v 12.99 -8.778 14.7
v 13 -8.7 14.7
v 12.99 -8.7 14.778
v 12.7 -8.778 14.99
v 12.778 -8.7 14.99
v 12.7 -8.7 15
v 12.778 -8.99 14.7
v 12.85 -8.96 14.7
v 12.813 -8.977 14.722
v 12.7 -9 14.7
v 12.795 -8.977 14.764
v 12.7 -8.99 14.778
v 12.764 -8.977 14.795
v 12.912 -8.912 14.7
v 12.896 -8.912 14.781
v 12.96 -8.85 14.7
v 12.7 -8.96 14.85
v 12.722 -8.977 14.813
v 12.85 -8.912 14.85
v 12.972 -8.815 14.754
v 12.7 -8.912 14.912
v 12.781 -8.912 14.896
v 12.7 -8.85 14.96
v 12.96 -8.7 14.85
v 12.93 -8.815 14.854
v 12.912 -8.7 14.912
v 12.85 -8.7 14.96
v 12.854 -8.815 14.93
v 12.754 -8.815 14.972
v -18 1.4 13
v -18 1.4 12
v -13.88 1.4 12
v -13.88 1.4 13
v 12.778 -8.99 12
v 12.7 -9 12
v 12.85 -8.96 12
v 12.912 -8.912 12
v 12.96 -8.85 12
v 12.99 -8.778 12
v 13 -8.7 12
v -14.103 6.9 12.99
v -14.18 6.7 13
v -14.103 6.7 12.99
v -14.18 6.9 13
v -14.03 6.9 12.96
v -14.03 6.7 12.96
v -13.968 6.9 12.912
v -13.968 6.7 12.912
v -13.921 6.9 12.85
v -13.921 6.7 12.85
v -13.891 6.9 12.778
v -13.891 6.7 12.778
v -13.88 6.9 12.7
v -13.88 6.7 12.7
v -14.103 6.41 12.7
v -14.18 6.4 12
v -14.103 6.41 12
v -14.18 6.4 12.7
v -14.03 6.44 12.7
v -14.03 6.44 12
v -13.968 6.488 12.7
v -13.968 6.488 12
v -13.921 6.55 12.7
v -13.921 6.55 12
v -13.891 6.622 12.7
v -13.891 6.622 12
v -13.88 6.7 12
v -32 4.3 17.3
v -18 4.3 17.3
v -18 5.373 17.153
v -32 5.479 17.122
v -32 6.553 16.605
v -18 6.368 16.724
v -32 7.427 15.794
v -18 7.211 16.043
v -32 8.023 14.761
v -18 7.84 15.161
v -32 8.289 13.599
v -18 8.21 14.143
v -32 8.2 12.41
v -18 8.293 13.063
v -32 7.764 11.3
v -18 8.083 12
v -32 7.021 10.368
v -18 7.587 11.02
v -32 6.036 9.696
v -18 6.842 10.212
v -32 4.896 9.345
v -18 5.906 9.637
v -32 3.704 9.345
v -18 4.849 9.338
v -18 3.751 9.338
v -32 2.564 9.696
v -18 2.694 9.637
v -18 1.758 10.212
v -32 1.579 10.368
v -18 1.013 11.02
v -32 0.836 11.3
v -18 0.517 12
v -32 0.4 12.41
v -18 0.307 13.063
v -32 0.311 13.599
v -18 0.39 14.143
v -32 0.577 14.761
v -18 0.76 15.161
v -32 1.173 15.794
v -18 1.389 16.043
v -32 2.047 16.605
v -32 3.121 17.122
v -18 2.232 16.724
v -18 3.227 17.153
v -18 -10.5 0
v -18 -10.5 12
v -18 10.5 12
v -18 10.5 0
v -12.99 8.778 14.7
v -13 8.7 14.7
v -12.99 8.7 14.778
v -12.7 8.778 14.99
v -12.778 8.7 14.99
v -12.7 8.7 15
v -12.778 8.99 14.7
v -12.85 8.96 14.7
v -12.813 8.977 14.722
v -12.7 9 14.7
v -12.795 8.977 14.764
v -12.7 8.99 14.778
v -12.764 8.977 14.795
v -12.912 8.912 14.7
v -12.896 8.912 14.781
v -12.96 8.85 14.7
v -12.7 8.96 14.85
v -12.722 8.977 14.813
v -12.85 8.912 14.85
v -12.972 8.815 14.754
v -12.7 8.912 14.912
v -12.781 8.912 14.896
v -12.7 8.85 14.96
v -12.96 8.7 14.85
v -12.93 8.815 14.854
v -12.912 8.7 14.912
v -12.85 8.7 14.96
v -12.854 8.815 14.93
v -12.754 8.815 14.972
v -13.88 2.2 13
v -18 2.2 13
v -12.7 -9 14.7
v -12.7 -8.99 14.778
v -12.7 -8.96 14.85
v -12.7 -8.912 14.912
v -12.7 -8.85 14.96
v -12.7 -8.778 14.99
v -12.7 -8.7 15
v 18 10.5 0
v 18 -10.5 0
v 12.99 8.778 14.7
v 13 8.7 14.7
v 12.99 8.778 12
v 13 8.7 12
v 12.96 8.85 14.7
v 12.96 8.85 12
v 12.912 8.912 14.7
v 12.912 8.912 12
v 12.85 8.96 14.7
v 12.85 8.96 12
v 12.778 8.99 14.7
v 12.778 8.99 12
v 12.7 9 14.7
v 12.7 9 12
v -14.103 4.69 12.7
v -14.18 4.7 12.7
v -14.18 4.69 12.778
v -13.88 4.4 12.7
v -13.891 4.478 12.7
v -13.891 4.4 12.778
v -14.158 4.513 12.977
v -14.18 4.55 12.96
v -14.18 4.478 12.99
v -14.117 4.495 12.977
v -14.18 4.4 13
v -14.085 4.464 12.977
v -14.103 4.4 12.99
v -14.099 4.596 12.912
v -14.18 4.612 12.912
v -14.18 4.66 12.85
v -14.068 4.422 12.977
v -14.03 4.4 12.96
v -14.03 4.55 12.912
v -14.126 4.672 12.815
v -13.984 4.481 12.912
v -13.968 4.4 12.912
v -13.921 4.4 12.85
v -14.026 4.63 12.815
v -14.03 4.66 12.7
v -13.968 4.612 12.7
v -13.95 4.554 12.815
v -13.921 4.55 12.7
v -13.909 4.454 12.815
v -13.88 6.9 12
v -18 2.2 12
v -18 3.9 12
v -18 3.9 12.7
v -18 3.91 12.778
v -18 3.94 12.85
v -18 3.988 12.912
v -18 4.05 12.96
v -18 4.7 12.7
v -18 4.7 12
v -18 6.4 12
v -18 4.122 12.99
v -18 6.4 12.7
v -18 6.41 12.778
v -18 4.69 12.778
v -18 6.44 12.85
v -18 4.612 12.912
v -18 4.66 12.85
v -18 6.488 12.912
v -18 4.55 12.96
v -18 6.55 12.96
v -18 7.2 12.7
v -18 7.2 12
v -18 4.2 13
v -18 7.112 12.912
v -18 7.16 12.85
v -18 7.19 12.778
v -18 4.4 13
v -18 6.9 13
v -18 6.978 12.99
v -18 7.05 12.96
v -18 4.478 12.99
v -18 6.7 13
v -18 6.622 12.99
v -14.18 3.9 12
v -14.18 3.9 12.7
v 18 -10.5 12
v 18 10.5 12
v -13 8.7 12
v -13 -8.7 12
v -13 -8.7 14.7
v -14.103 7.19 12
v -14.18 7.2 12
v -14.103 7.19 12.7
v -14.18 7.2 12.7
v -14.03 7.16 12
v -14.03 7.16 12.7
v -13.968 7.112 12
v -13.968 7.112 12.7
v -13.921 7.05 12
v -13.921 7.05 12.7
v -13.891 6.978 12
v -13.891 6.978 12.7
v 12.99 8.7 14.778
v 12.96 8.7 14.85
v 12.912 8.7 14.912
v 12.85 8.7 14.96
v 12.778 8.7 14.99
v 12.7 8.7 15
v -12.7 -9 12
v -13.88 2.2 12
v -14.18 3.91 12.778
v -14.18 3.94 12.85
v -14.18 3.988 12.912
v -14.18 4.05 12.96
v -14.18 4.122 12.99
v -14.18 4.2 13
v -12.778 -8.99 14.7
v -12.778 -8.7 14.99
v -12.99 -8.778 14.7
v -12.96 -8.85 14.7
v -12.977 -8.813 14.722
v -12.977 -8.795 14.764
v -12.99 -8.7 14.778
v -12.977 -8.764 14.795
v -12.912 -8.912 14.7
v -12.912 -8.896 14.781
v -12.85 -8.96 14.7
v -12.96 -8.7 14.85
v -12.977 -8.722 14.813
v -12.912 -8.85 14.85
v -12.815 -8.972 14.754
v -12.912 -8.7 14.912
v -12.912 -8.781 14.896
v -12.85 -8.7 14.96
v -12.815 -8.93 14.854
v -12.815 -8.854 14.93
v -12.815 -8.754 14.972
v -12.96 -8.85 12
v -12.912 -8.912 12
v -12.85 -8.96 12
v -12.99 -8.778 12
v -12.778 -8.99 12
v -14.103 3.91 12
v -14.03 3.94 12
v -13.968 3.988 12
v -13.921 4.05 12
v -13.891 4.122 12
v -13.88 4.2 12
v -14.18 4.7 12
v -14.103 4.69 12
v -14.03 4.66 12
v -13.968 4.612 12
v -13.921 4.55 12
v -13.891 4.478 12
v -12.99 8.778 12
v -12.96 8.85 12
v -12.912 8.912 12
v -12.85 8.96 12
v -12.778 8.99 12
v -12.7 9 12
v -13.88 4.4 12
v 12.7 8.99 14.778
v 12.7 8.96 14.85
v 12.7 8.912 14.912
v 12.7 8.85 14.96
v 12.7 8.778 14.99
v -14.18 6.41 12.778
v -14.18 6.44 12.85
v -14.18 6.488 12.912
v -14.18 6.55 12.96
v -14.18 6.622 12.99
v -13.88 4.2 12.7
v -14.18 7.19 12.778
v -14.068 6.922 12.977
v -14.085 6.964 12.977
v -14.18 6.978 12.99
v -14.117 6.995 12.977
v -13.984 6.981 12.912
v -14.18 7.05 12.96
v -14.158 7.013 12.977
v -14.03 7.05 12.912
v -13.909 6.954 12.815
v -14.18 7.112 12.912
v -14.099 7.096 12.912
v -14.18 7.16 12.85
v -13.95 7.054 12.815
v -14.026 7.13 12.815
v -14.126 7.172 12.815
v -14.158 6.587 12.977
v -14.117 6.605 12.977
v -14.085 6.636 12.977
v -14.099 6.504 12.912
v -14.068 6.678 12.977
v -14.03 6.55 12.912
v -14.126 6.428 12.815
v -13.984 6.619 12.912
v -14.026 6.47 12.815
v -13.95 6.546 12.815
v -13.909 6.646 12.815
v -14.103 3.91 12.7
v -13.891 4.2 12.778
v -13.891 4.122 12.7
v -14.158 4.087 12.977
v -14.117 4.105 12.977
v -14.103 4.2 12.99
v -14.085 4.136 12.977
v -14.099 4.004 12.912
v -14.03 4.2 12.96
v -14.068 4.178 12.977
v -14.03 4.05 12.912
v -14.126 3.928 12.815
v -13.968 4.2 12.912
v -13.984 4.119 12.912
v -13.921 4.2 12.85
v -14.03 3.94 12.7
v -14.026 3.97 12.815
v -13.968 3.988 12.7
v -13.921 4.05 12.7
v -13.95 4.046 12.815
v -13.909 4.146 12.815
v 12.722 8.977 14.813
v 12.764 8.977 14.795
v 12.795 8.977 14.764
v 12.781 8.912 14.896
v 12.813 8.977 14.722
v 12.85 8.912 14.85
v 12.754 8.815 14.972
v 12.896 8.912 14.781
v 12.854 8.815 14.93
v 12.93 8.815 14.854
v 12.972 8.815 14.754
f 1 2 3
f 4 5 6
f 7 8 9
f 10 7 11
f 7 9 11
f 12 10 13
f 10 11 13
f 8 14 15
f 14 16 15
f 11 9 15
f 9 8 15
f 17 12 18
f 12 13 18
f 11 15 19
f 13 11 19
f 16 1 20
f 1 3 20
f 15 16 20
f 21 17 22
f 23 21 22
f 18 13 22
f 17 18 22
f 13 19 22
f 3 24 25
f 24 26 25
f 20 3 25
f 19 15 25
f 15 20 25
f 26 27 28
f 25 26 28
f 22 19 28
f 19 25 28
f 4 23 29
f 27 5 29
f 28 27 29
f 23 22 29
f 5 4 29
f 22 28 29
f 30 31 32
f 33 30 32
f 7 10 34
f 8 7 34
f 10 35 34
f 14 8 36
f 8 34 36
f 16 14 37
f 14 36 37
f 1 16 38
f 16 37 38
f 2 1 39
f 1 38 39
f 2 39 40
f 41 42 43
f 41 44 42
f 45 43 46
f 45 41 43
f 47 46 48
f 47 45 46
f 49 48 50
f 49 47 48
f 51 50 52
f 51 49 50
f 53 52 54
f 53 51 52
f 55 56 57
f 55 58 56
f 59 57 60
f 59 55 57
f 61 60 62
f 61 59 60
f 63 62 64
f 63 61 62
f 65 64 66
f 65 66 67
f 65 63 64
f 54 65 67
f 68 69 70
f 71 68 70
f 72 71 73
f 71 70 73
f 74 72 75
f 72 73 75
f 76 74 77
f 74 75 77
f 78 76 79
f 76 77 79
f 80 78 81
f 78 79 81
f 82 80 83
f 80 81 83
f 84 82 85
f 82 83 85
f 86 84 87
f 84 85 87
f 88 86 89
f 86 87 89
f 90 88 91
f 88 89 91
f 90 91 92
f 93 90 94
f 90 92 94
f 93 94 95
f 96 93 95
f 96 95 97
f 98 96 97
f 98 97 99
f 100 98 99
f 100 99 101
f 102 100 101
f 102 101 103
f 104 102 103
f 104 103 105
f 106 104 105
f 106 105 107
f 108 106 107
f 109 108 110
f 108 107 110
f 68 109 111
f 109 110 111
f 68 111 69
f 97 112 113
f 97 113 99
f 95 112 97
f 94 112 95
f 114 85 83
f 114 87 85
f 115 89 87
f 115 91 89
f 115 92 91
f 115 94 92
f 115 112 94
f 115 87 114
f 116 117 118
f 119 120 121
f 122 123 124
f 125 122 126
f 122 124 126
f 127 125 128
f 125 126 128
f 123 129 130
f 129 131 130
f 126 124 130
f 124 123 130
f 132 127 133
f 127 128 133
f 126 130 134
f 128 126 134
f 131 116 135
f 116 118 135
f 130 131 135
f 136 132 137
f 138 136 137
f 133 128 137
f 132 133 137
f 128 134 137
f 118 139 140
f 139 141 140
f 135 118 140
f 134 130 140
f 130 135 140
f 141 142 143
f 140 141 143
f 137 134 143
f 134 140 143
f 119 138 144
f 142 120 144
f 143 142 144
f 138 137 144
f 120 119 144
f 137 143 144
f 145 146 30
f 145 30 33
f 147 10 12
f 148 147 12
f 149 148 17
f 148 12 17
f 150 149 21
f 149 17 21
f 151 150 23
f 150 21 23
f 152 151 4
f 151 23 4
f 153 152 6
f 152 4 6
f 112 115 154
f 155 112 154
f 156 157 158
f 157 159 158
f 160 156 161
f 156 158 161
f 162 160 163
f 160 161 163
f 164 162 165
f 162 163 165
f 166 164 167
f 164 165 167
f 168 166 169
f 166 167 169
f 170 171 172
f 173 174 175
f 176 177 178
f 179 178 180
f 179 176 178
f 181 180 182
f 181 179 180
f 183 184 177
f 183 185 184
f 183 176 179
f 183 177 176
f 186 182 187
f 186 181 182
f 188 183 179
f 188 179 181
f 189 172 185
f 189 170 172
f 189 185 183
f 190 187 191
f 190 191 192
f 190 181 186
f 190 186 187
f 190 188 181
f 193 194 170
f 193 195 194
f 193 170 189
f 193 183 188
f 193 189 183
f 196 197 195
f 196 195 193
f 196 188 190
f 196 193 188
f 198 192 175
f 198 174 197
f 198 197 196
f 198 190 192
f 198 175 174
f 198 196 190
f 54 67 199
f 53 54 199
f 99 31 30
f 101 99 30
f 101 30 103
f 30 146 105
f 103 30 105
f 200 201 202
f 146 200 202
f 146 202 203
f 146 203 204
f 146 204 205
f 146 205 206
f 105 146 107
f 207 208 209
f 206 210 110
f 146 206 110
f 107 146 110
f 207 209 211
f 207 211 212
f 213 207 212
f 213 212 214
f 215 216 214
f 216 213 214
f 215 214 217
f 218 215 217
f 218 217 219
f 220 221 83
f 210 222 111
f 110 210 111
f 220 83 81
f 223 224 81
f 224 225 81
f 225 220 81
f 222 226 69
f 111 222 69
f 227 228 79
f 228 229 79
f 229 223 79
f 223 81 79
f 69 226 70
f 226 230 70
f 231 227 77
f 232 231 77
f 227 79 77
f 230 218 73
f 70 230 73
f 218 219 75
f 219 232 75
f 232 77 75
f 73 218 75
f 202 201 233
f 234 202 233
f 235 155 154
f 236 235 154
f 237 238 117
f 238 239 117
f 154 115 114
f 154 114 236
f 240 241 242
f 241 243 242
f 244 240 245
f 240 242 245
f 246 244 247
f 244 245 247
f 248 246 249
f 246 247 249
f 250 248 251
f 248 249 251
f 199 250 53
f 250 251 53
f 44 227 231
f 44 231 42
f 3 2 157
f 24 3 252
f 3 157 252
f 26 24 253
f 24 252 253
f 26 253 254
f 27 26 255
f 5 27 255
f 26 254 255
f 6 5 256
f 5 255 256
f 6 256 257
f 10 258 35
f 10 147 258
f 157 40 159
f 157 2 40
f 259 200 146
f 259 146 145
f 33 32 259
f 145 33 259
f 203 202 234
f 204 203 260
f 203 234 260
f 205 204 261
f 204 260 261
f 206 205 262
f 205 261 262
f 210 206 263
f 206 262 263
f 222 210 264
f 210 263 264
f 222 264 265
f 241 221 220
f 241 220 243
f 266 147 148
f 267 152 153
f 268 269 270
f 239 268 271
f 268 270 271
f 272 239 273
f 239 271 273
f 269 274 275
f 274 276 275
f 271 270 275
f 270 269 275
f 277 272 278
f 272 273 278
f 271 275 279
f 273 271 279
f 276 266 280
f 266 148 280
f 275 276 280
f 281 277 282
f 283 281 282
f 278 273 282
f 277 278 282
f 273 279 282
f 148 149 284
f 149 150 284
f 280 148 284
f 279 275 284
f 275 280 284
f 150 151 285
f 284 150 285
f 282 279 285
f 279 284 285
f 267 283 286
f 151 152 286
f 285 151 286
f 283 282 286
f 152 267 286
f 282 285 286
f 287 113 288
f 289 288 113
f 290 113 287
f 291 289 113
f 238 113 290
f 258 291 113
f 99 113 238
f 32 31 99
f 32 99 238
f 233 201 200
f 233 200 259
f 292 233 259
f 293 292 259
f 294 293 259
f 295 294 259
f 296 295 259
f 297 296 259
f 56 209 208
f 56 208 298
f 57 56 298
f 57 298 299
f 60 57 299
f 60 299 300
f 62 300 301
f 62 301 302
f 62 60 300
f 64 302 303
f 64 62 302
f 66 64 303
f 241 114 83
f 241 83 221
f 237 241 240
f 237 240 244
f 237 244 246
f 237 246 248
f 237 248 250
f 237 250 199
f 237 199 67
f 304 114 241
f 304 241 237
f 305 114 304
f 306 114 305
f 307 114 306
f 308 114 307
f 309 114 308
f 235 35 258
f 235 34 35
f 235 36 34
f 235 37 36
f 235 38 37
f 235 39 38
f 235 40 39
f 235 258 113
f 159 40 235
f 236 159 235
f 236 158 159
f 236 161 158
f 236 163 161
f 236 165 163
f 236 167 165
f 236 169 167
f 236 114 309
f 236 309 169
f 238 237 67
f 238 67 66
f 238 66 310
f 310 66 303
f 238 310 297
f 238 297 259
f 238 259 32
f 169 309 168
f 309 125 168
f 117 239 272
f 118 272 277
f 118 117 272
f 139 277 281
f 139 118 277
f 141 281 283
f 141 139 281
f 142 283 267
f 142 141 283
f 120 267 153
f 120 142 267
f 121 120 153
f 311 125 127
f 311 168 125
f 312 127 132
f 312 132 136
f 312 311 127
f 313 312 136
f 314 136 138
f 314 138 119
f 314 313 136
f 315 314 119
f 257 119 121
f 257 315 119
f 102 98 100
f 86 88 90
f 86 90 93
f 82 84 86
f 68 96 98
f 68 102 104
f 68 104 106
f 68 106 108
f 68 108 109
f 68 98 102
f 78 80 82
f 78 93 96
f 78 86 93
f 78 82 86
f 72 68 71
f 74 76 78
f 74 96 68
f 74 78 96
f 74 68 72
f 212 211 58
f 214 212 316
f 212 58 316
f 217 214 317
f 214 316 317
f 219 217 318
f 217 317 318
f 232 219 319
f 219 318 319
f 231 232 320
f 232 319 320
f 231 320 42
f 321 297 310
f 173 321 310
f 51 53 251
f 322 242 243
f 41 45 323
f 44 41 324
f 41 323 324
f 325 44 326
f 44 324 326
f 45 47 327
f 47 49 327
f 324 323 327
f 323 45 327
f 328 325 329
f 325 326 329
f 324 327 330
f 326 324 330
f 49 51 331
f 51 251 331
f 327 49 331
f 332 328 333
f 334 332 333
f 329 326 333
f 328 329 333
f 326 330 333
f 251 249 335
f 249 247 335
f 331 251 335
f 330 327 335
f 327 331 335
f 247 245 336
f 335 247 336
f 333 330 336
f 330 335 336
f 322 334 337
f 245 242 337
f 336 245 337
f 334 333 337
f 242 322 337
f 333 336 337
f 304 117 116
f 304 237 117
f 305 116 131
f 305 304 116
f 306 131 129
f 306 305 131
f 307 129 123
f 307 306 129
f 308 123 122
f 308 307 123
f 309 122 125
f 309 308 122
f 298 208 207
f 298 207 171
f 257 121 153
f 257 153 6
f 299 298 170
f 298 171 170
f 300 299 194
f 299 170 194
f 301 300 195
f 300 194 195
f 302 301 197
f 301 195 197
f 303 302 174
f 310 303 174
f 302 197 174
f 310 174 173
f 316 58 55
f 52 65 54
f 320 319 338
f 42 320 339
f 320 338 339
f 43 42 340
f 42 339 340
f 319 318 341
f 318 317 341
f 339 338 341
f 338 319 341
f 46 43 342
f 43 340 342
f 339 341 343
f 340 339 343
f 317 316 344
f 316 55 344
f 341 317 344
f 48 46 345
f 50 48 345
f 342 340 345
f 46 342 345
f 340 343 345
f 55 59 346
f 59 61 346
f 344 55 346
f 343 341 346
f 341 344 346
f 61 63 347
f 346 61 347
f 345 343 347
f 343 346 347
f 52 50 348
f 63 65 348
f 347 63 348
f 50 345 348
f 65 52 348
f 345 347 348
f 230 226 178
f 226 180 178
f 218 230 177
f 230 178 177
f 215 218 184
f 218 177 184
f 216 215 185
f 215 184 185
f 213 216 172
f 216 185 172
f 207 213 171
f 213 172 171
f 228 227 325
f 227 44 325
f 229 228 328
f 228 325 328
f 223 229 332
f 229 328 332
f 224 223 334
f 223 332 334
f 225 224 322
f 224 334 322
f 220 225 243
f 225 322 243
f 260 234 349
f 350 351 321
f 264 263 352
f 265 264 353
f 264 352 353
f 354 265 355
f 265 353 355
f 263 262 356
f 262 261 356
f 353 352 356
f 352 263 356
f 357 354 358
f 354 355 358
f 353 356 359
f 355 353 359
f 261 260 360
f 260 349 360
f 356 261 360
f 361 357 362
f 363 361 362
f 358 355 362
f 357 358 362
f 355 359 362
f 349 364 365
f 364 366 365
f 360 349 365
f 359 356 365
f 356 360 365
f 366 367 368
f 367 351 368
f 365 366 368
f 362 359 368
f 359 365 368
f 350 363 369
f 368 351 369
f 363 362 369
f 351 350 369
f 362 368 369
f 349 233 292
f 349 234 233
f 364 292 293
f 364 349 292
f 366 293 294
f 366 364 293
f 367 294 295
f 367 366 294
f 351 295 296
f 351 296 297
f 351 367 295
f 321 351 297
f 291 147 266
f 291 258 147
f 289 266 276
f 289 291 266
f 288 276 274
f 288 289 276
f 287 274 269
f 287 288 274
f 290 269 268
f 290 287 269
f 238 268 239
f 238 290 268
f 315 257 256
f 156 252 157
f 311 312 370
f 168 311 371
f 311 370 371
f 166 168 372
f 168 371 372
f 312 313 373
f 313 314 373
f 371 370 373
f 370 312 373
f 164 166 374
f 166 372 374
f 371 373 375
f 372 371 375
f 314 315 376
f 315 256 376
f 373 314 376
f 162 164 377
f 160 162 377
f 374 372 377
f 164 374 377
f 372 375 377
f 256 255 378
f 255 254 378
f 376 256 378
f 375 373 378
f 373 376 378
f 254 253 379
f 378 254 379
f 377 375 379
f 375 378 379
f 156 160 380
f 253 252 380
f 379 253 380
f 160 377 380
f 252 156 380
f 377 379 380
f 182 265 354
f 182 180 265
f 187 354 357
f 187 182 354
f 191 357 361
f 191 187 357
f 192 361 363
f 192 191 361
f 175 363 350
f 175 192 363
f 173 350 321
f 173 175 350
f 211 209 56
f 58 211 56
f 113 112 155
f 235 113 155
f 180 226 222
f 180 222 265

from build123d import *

# Parameters (mm, degrees)
SKICA1_W                 = 36
SKICA1_H                 = 21
P_IDAT_VYSUNUT_M1_DEPTH  = 15
SKICA2_W                 = 40.125032636
SKICA2_H                 = 25.475200522
SKICA2_W_2               = 26
SKICA2_H_2               = 18
ODEBRAT_VYSUNUT_M1_DEPTH = 3
SKICA3_R                 = 4
P_IDAT_VYSUNUT_M2_DEPTH  = 14
SKICA4_W                 = 4.119571066
SKICA4_H                 = 0.8
P_IDAT_VYSUNUT_M3_DEPTH  = 1
ZAOBLIT3_R               = 0.3


with BuildPart() as part:
    # Skica1 → Přidat vysunutím1 (new body)
    with BuildSketch(Plane.XY):
        Rectangle(SKICA1_W, SKICA1_H)
    extrude(amount=P_IDAT_VYSUNUT_M1_DEPTH)

    # Skica2 → Odebrat vysunutím1 (cut)
    with BuildSketch(Plane.XY.offset(15)):
        Rectangle(SKICA2_W, SKICA2_H)
        Rectangle(SKICA2_W_2, SKICA2_H_2, mode=Mode.SUBTRACT)
    extrude(amount=-ODEBRAT_VYSUNUT_M1_DEPTH, mode=Mode.SUBTRACT)

    # Skica3 → Přidat vysunutím2 (add)
    with BuildSketch(Plane.ZY.offset(18)):
        with Locations((13.3, 4.3)):
            Circle(SKICA3_R)
    extrude(amount=P_IDAT_VYSUNUT_M2_DEPTH)

    # Skica4 → Přidat vysunutím3 (add)
    with BuildSketch(Plane.XY.offset(12)):
        with Locations((-15.940214467, 6.8)):
            Rectangle(SKICA4_W, SKICA4_H)
        with Locations((-15.940214467, 4.3)):
            Rectangle(SKICA4_W, SKICA4_H)
        with Locations((-15.940214467, 1.8)):
            Rectangle(SKICA4_W, SKICA4_H)
    extrude(amount=P_IDAT_VYSUNUT_M3_DEPTH)

    # Zaoblit3
    zaoblit3_edges = [part.edges().sort_by_distance(p)[0] for p in [
        (13, 0, 15),
        (13, -9, 13.5),
        (0, -9, 15),
        (-13, -9, 13.5),
        (-13, 0, 15),
        (-13, 9, 13.5),
        (0, 9, 15),
        (13, 9, 13.5),
        (-13.880428934, 6.4, 12.5),
        (-13.880428934, 7.2, 12.5),
        (-15.940214467, 6.4, 13),
        (-13.880428934, 6.8, 13),
        (-15.940214467, 7.2, 13),
        (-13.880428934, 4.7, 12.5),
        (-13.880428934, 3.9, 12.5),
        (-15.940214467, 4.7, 13),
        (-15.940214467, 3.9, 13),
        (-13.880428934, 4.3, 13),
    ]]
    fillet(zaoblit3_edges, radius=ZAOBLIT3_R)


solid = part.part
